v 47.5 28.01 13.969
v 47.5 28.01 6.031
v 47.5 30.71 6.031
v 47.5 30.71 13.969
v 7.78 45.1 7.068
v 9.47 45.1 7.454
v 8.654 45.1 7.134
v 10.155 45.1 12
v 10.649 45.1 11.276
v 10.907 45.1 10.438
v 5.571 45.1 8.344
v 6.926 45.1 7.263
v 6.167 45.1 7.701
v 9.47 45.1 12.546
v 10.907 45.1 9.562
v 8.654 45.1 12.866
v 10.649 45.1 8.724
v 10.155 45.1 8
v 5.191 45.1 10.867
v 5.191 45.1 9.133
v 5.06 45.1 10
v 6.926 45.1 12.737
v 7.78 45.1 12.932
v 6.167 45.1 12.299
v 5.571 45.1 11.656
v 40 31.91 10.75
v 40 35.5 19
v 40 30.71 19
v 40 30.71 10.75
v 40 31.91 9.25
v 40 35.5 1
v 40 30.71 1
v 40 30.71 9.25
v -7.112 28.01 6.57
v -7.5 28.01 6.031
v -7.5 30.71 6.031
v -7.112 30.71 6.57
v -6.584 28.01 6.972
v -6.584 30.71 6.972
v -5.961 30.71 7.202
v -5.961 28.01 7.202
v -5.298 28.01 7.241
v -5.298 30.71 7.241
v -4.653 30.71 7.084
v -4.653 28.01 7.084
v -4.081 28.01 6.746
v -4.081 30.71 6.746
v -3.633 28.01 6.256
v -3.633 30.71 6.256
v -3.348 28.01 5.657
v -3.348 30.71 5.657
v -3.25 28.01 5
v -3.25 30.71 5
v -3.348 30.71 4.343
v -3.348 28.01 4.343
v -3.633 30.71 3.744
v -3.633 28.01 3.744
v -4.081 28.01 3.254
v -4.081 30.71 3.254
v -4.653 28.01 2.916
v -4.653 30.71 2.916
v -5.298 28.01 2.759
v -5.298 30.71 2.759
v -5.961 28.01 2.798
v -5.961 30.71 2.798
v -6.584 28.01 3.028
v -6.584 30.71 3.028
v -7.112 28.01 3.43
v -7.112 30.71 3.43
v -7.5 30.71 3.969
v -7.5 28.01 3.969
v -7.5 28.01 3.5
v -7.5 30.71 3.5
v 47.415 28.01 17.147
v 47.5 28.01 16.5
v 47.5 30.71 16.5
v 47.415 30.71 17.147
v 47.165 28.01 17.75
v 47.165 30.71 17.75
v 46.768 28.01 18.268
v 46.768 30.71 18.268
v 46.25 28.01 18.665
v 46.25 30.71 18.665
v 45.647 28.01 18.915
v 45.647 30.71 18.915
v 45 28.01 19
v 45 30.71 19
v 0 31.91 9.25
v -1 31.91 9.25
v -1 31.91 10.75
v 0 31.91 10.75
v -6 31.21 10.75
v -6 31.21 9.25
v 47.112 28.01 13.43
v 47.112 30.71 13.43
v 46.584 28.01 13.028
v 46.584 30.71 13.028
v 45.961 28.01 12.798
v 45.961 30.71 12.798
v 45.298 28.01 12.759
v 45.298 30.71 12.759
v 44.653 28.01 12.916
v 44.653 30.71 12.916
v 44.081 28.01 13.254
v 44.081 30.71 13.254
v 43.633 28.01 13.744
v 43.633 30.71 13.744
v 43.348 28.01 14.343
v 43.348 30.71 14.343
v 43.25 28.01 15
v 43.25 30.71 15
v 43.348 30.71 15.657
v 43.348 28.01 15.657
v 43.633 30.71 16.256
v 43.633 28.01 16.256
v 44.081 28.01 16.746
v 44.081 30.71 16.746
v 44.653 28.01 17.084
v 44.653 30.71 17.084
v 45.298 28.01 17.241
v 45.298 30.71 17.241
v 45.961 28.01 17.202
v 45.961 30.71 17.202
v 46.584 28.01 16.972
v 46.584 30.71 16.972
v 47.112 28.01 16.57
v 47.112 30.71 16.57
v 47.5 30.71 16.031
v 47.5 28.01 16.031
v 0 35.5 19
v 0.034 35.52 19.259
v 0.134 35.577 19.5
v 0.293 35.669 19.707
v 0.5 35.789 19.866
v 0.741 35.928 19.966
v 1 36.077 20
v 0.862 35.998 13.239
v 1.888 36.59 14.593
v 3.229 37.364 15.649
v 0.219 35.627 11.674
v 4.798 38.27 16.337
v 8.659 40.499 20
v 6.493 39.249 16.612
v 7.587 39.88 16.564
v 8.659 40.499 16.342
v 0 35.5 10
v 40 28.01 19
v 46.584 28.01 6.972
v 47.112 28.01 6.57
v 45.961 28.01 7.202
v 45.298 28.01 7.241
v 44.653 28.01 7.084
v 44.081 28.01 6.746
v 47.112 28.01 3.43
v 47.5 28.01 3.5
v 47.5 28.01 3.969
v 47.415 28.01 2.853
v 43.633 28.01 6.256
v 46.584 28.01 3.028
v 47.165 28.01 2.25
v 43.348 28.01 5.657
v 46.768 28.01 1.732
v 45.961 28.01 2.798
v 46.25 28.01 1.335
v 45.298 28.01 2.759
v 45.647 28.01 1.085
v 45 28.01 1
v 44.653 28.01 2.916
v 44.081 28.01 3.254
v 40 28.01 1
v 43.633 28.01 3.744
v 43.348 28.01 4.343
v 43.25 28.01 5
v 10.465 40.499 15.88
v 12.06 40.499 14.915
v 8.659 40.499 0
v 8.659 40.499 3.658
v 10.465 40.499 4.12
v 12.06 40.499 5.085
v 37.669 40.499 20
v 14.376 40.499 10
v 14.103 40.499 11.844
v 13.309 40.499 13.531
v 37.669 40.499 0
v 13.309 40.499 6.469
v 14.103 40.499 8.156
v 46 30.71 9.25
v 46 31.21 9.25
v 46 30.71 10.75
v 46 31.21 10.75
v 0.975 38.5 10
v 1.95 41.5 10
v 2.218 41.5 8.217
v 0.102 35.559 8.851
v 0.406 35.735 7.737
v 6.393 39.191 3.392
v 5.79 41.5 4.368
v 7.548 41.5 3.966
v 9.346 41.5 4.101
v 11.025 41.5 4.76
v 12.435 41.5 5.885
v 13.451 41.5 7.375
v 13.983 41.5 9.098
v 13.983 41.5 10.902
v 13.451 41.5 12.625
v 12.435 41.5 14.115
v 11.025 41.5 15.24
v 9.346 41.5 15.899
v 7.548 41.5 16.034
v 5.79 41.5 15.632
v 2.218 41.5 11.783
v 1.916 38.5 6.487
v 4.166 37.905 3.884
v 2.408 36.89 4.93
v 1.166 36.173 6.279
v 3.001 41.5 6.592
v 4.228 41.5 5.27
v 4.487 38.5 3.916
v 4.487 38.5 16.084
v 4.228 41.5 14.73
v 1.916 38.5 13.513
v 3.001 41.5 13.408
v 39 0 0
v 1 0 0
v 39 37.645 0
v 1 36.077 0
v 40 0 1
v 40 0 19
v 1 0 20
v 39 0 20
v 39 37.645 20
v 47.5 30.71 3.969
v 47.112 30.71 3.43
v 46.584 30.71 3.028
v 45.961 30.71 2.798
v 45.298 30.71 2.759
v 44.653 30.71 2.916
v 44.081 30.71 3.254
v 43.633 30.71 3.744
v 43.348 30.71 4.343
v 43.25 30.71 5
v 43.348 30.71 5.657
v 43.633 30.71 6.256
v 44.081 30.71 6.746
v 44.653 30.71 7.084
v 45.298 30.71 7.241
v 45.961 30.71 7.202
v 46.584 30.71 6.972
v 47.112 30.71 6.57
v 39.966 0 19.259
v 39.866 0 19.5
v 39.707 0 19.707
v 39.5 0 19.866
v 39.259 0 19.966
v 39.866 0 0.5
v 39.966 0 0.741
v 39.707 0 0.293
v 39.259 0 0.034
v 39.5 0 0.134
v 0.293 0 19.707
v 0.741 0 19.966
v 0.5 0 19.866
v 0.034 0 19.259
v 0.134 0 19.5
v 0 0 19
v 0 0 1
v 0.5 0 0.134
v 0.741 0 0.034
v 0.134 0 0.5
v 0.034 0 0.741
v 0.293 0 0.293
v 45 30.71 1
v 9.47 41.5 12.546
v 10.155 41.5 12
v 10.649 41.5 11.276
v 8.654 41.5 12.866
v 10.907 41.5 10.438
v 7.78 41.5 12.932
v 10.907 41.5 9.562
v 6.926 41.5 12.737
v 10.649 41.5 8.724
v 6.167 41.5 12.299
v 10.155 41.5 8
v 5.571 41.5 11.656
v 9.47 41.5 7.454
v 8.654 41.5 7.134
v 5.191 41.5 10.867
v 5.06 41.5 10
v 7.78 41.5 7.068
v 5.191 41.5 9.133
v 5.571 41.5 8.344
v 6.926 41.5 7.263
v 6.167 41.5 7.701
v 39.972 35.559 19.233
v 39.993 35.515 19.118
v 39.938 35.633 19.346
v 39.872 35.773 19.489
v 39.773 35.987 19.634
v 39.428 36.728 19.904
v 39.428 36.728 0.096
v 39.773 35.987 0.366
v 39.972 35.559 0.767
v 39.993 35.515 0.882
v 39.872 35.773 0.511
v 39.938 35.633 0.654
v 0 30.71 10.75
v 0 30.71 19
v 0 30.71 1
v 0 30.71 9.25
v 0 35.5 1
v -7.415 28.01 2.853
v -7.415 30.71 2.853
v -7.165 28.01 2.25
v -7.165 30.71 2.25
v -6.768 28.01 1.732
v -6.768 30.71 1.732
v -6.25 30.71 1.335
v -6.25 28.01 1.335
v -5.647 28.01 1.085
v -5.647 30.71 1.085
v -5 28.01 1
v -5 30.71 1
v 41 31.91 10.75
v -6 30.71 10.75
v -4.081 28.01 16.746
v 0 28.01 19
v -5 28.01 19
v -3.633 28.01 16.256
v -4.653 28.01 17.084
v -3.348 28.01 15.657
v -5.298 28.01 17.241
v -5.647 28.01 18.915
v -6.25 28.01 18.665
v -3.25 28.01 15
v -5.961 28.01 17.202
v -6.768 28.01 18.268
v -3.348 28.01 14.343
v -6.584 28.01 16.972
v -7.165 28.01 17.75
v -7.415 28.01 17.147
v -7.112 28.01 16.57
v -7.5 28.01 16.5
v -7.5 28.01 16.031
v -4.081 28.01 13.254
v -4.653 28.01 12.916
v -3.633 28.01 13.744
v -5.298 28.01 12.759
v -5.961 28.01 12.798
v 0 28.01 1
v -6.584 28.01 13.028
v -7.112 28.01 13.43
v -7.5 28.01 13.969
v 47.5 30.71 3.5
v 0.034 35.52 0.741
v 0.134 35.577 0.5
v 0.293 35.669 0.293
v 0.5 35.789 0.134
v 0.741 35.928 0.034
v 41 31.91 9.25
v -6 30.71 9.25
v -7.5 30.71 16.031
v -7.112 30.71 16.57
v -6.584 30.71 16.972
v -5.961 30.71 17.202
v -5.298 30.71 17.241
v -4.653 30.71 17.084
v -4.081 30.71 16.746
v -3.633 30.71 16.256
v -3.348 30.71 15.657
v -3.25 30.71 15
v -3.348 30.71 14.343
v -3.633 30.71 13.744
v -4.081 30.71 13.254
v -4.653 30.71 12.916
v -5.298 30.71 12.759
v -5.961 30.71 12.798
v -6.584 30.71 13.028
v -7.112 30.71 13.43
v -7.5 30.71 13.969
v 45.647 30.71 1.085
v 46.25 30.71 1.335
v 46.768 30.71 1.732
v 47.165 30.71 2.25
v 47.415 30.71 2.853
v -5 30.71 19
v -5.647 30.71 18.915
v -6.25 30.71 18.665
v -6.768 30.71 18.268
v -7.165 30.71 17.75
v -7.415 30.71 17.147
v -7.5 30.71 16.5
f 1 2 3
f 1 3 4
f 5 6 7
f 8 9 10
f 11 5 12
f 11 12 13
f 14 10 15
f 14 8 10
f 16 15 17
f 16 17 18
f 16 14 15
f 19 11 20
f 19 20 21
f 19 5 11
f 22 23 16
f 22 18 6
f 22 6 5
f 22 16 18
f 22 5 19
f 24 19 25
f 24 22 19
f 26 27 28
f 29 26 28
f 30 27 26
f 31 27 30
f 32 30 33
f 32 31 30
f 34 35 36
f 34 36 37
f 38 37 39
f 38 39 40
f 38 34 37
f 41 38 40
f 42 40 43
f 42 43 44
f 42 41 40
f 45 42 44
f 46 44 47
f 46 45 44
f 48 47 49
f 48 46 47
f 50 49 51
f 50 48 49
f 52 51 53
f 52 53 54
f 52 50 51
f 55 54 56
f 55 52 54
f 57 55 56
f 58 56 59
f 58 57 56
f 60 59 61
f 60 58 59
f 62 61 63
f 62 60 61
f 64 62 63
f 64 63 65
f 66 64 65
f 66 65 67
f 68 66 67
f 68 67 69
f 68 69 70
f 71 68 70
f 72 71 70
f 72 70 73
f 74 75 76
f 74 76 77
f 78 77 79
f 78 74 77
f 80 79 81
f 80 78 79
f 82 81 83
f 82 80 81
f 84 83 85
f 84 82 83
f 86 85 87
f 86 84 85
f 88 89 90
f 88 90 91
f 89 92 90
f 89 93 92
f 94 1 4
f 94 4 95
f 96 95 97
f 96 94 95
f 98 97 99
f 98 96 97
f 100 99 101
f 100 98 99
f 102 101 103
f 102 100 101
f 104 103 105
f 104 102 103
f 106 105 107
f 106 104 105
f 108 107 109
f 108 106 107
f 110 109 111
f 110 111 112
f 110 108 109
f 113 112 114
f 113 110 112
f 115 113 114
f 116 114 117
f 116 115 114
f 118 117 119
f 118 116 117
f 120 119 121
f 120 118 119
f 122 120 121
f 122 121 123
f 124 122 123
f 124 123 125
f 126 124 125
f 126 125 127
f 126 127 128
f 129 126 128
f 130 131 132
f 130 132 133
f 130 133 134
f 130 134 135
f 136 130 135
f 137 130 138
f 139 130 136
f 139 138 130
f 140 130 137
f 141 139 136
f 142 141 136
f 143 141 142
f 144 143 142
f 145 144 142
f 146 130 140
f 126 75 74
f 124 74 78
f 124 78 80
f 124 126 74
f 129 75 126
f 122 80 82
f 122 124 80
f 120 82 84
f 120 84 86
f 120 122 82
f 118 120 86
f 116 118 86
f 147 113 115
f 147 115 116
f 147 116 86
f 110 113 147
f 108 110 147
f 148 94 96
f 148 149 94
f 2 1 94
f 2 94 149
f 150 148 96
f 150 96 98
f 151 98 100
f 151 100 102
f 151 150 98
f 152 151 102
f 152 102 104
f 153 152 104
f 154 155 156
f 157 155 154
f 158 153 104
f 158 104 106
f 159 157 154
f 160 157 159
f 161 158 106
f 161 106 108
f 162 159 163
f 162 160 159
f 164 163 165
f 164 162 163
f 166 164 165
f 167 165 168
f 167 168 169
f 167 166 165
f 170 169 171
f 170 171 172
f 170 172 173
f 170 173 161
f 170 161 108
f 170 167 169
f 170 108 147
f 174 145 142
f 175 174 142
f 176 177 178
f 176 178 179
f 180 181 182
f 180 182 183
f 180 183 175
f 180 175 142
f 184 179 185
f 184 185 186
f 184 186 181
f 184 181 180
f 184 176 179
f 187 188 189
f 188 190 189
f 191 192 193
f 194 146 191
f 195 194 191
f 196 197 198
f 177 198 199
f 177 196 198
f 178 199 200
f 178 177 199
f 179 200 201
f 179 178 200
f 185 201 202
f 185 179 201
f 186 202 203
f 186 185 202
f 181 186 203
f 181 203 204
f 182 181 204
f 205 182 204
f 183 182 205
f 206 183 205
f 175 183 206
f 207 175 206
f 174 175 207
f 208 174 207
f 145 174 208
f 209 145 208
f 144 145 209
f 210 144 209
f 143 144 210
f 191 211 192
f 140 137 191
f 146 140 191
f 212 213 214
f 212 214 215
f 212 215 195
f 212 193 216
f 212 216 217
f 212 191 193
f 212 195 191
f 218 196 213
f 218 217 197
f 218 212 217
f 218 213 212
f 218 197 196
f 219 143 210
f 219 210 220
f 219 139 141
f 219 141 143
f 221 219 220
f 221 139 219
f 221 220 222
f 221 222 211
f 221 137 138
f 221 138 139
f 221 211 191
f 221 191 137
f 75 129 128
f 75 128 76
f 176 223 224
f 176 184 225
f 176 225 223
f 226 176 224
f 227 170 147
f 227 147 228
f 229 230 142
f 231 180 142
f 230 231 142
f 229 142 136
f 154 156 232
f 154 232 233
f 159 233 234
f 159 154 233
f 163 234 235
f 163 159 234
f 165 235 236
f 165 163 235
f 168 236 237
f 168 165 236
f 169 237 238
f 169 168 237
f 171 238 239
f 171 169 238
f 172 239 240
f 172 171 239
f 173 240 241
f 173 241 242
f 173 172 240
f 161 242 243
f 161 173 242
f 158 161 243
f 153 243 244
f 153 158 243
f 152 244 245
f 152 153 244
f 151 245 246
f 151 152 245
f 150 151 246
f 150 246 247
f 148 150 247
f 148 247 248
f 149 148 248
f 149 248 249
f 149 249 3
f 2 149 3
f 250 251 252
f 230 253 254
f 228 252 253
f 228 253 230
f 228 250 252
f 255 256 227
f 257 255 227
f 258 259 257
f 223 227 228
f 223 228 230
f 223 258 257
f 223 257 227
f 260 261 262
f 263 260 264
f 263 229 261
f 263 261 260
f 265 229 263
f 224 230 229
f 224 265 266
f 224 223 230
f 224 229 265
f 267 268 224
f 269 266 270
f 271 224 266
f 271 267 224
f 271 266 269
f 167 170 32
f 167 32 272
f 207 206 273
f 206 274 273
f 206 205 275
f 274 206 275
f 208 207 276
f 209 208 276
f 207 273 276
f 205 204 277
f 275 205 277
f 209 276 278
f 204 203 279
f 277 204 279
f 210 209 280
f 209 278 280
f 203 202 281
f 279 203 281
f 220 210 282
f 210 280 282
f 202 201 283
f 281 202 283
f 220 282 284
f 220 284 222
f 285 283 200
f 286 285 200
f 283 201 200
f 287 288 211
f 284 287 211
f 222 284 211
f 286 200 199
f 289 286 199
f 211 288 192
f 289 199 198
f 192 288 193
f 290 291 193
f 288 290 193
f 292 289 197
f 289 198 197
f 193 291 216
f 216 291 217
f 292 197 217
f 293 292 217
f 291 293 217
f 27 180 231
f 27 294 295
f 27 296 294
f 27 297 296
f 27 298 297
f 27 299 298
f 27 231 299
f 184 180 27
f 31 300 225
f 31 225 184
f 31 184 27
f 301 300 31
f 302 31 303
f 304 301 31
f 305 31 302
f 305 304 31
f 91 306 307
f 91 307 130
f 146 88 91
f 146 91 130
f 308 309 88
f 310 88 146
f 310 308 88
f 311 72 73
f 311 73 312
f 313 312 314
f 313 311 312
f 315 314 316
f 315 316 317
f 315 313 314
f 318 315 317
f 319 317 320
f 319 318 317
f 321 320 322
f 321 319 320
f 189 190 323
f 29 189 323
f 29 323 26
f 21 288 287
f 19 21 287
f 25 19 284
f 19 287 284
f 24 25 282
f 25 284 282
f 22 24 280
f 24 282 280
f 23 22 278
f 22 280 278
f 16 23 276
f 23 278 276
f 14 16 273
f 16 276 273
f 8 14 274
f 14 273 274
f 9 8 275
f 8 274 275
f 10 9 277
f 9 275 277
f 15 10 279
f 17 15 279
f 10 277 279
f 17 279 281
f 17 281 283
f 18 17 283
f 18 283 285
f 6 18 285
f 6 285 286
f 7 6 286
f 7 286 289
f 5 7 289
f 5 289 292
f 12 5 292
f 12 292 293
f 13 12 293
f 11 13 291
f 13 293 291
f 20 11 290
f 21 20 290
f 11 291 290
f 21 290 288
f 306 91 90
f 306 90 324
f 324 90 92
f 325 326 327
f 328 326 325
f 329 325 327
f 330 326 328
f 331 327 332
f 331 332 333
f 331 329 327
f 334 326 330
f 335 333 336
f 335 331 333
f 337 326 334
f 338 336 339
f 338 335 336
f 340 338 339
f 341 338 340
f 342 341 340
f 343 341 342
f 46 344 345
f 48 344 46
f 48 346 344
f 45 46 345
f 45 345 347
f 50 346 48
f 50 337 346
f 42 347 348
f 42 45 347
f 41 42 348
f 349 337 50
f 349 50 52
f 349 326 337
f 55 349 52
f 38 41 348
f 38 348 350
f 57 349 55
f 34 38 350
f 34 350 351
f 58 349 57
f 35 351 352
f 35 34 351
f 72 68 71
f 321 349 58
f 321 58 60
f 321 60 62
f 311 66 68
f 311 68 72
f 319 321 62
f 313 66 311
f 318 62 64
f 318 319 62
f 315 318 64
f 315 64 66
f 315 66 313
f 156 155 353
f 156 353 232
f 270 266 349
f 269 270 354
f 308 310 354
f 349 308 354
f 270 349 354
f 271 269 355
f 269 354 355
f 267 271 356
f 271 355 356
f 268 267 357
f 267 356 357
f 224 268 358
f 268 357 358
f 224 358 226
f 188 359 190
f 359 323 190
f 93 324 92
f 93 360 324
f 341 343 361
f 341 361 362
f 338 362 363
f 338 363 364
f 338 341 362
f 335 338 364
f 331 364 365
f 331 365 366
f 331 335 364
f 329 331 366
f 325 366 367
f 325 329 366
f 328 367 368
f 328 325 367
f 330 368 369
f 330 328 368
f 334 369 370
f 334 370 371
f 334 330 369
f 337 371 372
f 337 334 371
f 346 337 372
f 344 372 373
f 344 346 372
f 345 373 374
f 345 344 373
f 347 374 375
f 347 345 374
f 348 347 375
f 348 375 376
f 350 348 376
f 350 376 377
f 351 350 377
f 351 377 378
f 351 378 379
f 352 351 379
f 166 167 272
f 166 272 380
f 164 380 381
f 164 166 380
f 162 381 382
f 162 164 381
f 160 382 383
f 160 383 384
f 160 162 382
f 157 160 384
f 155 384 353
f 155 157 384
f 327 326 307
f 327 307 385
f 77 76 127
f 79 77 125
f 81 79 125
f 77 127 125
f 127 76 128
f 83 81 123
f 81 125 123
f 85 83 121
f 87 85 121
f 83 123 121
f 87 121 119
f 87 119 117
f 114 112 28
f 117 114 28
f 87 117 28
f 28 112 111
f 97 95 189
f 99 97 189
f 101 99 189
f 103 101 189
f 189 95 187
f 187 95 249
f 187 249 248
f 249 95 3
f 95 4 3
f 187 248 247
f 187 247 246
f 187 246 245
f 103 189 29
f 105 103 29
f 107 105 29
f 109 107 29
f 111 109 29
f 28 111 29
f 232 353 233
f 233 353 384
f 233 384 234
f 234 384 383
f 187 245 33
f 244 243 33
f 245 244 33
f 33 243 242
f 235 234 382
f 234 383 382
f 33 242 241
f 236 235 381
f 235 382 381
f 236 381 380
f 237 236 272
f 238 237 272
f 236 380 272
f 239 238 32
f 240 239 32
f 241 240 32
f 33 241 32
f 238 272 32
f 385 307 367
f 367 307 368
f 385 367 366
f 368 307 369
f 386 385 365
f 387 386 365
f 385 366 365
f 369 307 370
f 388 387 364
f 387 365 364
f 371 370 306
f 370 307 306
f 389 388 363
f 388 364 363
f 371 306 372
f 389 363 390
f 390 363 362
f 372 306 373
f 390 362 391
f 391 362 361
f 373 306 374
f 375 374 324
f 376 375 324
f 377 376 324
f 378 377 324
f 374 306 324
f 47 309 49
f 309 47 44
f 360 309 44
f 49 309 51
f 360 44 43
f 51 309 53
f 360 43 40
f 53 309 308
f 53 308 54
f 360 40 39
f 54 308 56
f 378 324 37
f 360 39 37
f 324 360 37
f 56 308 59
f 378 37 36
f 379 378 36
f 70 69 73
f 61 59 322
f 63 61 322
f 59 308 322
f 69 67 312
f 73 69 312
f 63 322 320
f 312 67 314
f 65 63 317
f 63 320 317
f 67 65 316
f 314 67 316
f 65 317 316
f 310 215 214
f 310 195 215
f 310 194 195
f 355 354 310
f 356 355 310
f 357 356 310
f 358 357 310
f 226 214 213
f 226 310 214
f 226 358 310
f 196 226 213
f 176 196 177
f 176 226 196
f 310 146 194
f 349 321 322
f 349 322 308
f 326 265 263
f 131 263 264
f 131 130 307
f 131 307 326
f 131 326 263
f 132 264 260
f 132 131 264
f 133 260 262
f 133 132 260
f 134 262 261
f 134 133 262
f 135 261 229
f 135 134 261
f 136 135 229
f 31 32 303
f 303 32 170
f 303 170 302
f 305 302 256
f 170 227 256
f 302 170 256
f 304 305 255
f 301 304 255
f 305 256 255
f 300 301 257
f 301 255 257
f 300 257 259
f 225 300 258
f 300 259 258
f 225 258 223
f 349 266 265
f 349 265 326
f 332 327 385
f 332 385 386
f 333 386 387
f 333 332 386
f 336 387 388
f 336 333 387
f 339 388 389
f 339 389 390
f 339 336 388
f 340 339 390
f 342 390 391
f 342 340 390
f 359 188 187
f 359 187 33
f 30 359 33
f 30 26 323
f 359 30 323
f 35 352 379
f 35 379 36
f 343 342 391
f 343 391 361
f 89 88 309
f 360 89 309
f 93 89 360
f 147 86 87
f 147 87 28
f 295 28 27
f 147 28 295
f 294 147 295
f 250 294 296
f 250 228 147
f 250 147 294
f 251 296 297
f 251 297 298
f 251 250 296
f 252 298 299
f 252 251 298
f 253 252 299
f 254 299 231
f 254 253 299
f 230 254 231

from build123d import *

# Parameters (mm, degrees)
SALIENTE_EXTRUIR1_DEPTH = 20
REDONDEO1_R             = 1
CROQUIS2_R              = 8
SALIENTE_EXTRUIR2_DEPTH = 6
SALIENTE_EXTRUIR2_DRAFT = -18
CROQUIS3_R              = 2.94
SALIENTE_EXTRUIR3_DEPTH = 3.6
SALIENTE_EXTRUIR4_DEPTH = 2.7
SALIENTE_EXTRUIR5_DEPTH = 0.75


with BuildPart() as part:
    # Croquis1 → Saliente-Extruir1 (new body)
    with BuildSketch(Plane.XY):
        Polygon((40, 0), (0, 0), (0, 35.5), (8.658841891, 40.499184697), (37.668841891, 40.499184697), (40, 35.5), align=None)
    extrude(amount=SALIENTE_EXTRUIR1_DEPTH)

    # Redondeo1
    redondeo1_edges = [part.edges().sort_by_distance(p)[0] for p in [
        (0, 17.75, 0),
        (0, 17.75, 20),
        (40, 17.75, 0),
        (40, 17.75, 20),
    ]]
    fillet(redondeo1_edges, radius=REDONDEO1_R)


with BuildPart() as saliente_extruir2_tool:
    # Croquis2 → Saliente-Extruir2 (with draft: the straight prism first)
    with BuildSketch(Plane(origin=(0, 35.5, 0), x_dir=(-1, 0, 0), z_dir=(0, -1, 0))):
        with Locations((-8, -10)):
            Circle(CROQUIS2_R)
    extrude(amount=-SALIENTE_EXTRUIR2_DEPTH)
    # Saliente-Extruir2: the draft: its side faces are tilted about the plane it starts from
    saliente_extruir2_sides = [saliente_extruir2_tool.faces().sort_by_distance(p)[0] for p in [
        (16, 38.5, 10),
    ]]
    draft(saliente_extruir2_sides, Plane(origin=(0, 35.5, 0), x_dir=(-1, 0, 0), z_dir=(0, -1, 0)), SALIENTE_EXTRUIR2_DRAFT)


with BuildPart() as part_1:
    add(part.part)

    # Saliente-Extruir2: add saliente_extruir2_tool
    add(saliente_extruir2_tool.part)

    # Croquis3 → Saliente-Extruir3 (add)
    with BuildSketch(Plane(origin=(0, 41.5, 0), x_dir=(1, 0, 0), z_dir=(0, 1, 0))):
        with Locations((8, -10)):
            Circle(CROQUIS3_R)
    extrude(amount=SALIENTE_EXTRUIR3_DEPTH)

    # Croquis4 → Saliente-Extruir4 (add)
    with BuildSketch(Plane(origin=(0, 28.01, 0), x_dir=(-1, 0, 0), z_dir=(0, -1, 0))):
        with BuildLine():
            Line((-45, -19), (-40, -19))
            Line((-40, -19), (-40, -1))
            Line((-40, -1), (-45, -1))
            ThreePointArc((-45, -1), (-46.767766953, -1.732233047), (-47.5, -3.5))
            Line((-47.5, -3.5), (-47.5, -3.969223594))
            ThreePointArc((-47.5, -3.969223594), (-43.25, -5), (-47.5, -6.030776406))
            Line((-47.5, -6.030776406), (-47.5, -13.969223594))
            ThreePointArc((-47.5, -13.969223594), (-43.25, -15), (-47.5, -16.030776406))
            Line((-47.5, -16.030776406), (-47.5, -16.5))
            ThreePointArc((-47.5, -16.5), (-46.767766953, -18.267766953), (-45, -19))
        make_face()
        with BuildLine():
            Line((0, -19), (5, -19))
            ThreePointArc((5, -19), (6.767766953, -18.267766953), (7.5, -16.5))
            Line((7.5, -16.5), (7.5, -16.030776406))
            ThreePointArc((7.5, -16.030776406), (3.25, -15), (7.5, -13.969223594))
            Line((7.5, -13.969223594), (7.5, -6.030776406))
            ThreePointArc((7.5, -6.030776406), (3.25, -5), (7.5, -3.969223594))
            Line((7.5, -3.969223594), (7.5, -3.5))
            ThreePointArc((7.5, -3.5), (6.767766953, -1.732233047), (5, -1))
            Line((5, -1), (0, -1))
            Line((0, -1), (0, -19))
        make_face()
    extrude(amount=-SALIENTE_EXTRUIR4_DEPTH)

    # Croquis5 → Saliente-Extruir5 (add, symmetric)
    with BuildSketch(Plane.XY.offset(10)):
        Polygon((-6, 31.21), (-1.000247602, 31.91), (0, 31.91), (0, 30.71), (-6, 30.71), align=None)
        Polygon((40, 31.91), (41.000247602, 31.91), (46, 31.21), (46, 30.71), (40, 30.71), align=None)
    extrude(amount=SALIENTE_EXTRUIR5_DEPTH, both=True)


solid = part_1.part
